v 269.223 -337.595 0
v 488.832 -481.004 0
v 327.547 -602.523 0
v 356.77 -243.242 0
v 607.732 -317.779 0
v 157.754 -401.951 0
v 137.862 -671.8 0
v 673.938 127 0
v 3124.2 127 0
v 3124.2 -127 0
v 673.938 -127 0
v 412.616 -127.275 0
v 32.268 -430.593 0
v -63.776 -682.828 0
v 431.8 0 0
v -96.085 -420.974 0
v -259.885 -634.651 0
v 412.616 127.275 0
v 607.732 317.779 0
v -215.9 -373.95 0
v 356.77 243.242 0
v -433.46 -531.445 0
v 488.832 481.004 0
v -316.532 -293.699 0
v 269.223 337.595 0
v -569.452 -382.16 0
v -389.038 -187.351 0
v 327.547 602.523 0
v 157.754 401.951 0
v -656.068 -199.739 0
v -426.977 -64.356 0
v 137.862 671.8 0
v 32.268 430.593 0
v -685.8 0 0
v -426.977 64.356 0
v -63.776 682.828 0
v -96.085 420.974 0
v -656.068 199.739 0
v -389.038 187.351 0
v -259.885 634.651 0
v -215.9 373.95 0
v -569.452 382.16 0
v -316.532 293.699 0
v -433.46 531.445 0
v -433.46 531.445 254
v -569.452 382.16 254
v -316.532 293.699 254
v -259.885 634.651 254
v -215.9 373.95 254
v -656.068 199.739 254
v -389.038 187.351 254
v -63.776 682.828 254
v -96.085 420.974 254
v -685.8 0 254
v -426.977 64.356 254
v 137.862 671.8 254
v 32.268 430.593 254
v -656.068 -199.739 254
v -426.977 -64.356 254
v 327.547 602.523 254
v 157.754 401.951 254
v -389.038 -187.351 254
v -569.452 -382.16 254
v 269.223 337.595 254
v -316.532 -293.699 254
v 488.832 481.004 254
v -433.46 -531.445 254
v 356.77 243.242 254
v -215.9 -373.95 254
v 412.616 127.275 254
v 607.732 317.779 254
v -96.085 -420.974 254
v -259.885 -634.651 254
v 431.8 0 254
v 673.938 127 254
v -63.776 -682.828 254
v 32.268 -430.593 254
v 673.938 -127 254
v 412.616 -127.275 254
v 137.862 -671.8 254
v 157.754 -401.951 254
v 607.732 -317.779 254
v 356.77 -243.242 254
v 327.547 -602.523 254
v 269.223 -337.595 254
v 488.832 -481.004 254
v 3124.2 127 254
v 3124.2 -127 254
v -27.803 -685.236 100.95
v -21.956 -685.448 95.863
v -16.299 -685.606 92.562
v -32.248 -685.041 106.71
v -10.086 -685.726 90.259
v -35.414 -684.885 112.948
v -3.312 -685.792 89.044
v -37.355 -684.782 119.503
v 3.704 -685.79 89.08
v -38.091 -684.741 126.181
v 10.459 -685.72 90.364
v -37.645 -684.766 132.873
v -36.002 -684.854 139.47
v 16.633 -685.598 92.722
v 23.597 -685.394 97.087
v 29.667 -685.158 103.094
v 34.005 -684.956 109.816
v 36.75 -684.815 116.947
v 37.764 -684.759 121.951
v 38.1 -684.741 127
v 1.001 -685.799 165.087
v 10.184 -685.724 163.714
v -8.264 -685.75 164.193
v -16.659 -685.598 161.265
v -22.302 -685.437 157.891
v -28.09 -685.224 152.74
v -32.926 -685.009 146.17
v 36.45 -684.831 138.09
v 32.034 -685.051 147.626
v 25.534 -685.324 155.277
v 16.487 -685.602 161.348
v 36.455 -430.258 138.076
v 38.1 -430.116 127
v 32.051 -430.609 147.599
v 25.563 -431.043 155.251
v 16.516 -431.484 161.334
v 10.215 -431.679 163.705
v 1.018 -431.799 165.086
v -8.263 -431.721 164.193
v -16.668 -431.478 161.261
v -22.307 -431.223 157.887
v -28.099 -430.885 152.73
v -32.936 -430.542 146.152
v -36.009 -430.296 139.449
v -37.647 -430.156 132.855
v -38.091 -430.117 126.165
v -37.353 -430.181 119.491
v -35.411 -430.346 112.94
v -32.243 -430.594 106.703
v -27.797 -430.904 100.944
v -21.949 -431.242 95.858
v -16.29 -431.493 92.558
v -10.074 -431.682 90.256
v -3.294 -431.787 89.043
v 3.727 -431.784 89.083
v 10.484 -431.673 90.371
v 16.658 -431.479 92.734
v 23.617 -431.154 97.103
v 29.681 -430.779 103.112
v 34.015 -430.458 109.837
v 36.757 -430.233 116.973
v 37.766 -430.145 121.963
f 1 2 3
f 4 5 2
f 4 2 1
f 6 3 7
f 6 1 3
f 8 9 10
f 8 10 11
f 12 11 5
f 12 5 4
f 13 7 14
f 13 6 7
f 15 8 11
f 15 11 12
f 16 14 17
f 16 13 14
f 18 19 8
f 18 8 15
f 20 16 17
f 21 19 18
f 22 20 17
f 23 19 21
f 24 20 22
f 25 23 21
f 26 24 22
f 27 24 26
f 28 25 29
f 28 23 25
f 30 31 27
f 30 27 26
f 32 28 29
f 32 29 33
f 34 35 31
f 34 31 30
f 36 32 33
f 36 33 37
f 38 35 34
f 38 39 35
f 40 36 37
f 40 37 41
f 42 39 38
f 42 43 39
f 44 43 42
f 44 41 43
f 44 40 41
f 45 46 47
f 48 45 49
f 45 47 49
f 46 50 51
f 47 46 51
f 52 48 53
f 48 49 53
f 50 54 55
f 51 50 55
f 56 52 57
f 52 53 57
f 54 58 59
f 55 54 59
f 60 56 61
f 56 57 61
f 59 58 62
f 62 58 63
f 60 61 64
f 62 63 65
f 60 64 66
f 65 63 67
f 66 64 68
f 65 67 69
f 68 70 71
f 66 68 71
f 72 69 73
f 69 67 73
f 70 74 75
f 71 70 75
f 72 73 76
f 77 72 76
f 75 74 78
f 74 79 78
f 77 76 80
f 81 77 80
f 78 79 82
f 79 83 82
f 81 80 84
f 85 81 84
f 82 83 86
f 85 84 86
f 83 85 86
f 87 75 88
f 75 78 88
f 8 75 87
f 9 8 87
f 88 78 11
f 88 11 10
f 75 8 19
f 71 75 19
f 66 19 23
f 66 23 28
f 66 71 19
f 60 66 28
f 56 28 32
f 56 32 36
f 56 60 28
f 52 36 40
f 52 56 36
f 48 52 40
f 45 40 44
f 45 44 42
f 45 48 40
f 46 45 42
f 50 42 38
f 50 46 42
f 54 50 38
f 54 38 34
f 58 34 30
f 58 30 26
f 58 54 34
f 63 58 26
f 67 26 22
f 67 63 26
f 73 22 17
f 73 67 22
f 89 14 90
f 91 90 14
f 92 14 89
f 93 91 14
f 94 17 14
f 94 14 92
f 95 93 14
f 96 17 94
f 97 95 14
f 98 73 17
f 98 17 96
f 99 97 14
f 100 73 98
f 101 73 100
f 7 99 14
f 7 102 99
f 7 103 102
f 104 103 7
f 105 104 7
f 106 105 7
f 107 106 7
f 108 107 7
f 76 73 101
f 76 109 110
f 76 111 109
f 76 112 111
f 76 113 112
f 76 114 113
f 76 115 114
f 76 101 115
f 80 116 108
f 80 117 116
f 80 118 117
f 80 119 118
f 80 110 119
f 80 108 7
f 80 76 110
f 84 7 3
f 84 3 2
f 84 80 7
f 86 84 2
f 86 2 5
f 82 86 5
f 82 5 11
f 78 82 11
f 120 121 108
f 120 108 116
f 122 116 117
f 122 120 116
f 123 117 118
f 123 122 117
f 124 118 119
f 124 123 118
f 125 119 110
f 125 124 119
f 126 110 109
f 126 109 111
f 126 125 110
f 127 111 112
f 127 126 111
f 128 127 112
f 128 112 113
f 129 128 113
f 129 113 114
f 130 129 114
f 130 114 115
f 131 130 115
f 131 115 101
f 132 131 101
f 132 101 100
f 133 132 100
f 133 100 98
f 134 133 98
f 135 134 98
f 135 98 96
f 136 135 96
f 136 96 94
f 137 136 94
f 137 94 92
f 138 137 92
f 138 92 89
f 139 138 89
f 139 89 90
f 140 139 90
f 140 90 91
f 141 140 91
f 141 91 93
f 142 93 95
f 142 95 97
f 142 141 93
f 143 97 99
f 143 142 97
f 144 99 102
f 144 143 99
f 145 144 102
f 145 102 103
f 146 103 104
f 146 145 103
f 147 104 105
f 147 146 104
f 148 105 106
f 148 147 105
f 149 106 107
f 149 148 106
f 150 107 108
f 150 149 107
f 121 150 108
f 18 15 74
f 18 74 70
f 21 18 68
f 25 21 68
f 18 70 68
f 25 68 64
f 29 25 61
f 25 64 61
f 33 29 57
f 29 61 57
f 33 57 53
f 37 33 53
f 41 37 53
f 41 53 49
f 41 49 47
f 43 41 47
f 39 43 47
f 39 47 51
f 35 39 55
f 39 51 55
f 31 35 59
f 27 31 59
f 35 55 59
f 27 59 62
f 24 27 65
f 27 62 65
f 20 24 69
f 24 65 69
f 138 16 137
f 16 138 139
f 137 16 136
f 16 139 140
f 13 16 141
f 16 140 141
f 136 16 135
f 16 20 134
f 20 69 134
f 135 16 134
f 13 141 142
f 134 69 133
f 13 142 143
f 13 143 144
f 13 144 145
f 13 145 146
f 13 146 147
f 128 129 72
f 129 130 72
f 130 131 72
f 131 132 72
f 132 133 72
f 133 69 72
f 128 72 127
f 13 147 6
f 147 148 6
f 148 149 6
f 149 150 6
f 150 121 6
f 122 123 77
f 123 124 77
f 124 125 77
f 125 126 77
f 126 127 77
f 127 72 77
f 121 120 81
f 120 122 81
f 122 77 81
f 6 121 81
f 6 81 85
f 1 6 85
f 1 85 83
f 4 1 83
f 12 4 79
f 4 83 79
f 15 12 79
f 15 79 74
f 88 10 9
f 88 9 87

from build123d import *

# Parameters (mm, degrees)
F0_W     = 254
F0_H     = 254
F3_W     = 2540
F3_H     = 254
F4_DEPTH = 127
F6_DEPTH = 685.801


# Not quite as in the source:
# - a feature names something its author has since deleted; it is built from what else it names


with BuildPart() as f2:
    # F0 (on Front) → F2 (revolve)
    with BuildSketch(Plane.XZ):
        with Locations((558.8, 127)):
            Rectangle(F0_W, F0_H)
    revolve(axis=Axis((0, 0, 38.9041751623), (0, 0, 1)))

    # F3 (on Front) → F4 (join, symmetric)
    with BuildSketch(Plane.XZ):
        with Locations((1854.2, 127)):
            Rectangle(F3_W, F3_H)
    extrude(amount=F4_DEPTH, both=True)

    # F5 (on Front) → F6 (cut, through all)
    with BuildSketch(Plane.XZ):
        with BuildLine():
            ThreePointArc((0, 88.9), (26.9407683632, 100.0592316368), (38.1, 127))
            ThreePointArc((38.1, 127), (-26.9407683632, 153.9407683632), (0, 88.9))
        make_face()
    extrude(amount=F6_DEPTH, mode=Mode.SUBTRACT)


solid = f2.part
